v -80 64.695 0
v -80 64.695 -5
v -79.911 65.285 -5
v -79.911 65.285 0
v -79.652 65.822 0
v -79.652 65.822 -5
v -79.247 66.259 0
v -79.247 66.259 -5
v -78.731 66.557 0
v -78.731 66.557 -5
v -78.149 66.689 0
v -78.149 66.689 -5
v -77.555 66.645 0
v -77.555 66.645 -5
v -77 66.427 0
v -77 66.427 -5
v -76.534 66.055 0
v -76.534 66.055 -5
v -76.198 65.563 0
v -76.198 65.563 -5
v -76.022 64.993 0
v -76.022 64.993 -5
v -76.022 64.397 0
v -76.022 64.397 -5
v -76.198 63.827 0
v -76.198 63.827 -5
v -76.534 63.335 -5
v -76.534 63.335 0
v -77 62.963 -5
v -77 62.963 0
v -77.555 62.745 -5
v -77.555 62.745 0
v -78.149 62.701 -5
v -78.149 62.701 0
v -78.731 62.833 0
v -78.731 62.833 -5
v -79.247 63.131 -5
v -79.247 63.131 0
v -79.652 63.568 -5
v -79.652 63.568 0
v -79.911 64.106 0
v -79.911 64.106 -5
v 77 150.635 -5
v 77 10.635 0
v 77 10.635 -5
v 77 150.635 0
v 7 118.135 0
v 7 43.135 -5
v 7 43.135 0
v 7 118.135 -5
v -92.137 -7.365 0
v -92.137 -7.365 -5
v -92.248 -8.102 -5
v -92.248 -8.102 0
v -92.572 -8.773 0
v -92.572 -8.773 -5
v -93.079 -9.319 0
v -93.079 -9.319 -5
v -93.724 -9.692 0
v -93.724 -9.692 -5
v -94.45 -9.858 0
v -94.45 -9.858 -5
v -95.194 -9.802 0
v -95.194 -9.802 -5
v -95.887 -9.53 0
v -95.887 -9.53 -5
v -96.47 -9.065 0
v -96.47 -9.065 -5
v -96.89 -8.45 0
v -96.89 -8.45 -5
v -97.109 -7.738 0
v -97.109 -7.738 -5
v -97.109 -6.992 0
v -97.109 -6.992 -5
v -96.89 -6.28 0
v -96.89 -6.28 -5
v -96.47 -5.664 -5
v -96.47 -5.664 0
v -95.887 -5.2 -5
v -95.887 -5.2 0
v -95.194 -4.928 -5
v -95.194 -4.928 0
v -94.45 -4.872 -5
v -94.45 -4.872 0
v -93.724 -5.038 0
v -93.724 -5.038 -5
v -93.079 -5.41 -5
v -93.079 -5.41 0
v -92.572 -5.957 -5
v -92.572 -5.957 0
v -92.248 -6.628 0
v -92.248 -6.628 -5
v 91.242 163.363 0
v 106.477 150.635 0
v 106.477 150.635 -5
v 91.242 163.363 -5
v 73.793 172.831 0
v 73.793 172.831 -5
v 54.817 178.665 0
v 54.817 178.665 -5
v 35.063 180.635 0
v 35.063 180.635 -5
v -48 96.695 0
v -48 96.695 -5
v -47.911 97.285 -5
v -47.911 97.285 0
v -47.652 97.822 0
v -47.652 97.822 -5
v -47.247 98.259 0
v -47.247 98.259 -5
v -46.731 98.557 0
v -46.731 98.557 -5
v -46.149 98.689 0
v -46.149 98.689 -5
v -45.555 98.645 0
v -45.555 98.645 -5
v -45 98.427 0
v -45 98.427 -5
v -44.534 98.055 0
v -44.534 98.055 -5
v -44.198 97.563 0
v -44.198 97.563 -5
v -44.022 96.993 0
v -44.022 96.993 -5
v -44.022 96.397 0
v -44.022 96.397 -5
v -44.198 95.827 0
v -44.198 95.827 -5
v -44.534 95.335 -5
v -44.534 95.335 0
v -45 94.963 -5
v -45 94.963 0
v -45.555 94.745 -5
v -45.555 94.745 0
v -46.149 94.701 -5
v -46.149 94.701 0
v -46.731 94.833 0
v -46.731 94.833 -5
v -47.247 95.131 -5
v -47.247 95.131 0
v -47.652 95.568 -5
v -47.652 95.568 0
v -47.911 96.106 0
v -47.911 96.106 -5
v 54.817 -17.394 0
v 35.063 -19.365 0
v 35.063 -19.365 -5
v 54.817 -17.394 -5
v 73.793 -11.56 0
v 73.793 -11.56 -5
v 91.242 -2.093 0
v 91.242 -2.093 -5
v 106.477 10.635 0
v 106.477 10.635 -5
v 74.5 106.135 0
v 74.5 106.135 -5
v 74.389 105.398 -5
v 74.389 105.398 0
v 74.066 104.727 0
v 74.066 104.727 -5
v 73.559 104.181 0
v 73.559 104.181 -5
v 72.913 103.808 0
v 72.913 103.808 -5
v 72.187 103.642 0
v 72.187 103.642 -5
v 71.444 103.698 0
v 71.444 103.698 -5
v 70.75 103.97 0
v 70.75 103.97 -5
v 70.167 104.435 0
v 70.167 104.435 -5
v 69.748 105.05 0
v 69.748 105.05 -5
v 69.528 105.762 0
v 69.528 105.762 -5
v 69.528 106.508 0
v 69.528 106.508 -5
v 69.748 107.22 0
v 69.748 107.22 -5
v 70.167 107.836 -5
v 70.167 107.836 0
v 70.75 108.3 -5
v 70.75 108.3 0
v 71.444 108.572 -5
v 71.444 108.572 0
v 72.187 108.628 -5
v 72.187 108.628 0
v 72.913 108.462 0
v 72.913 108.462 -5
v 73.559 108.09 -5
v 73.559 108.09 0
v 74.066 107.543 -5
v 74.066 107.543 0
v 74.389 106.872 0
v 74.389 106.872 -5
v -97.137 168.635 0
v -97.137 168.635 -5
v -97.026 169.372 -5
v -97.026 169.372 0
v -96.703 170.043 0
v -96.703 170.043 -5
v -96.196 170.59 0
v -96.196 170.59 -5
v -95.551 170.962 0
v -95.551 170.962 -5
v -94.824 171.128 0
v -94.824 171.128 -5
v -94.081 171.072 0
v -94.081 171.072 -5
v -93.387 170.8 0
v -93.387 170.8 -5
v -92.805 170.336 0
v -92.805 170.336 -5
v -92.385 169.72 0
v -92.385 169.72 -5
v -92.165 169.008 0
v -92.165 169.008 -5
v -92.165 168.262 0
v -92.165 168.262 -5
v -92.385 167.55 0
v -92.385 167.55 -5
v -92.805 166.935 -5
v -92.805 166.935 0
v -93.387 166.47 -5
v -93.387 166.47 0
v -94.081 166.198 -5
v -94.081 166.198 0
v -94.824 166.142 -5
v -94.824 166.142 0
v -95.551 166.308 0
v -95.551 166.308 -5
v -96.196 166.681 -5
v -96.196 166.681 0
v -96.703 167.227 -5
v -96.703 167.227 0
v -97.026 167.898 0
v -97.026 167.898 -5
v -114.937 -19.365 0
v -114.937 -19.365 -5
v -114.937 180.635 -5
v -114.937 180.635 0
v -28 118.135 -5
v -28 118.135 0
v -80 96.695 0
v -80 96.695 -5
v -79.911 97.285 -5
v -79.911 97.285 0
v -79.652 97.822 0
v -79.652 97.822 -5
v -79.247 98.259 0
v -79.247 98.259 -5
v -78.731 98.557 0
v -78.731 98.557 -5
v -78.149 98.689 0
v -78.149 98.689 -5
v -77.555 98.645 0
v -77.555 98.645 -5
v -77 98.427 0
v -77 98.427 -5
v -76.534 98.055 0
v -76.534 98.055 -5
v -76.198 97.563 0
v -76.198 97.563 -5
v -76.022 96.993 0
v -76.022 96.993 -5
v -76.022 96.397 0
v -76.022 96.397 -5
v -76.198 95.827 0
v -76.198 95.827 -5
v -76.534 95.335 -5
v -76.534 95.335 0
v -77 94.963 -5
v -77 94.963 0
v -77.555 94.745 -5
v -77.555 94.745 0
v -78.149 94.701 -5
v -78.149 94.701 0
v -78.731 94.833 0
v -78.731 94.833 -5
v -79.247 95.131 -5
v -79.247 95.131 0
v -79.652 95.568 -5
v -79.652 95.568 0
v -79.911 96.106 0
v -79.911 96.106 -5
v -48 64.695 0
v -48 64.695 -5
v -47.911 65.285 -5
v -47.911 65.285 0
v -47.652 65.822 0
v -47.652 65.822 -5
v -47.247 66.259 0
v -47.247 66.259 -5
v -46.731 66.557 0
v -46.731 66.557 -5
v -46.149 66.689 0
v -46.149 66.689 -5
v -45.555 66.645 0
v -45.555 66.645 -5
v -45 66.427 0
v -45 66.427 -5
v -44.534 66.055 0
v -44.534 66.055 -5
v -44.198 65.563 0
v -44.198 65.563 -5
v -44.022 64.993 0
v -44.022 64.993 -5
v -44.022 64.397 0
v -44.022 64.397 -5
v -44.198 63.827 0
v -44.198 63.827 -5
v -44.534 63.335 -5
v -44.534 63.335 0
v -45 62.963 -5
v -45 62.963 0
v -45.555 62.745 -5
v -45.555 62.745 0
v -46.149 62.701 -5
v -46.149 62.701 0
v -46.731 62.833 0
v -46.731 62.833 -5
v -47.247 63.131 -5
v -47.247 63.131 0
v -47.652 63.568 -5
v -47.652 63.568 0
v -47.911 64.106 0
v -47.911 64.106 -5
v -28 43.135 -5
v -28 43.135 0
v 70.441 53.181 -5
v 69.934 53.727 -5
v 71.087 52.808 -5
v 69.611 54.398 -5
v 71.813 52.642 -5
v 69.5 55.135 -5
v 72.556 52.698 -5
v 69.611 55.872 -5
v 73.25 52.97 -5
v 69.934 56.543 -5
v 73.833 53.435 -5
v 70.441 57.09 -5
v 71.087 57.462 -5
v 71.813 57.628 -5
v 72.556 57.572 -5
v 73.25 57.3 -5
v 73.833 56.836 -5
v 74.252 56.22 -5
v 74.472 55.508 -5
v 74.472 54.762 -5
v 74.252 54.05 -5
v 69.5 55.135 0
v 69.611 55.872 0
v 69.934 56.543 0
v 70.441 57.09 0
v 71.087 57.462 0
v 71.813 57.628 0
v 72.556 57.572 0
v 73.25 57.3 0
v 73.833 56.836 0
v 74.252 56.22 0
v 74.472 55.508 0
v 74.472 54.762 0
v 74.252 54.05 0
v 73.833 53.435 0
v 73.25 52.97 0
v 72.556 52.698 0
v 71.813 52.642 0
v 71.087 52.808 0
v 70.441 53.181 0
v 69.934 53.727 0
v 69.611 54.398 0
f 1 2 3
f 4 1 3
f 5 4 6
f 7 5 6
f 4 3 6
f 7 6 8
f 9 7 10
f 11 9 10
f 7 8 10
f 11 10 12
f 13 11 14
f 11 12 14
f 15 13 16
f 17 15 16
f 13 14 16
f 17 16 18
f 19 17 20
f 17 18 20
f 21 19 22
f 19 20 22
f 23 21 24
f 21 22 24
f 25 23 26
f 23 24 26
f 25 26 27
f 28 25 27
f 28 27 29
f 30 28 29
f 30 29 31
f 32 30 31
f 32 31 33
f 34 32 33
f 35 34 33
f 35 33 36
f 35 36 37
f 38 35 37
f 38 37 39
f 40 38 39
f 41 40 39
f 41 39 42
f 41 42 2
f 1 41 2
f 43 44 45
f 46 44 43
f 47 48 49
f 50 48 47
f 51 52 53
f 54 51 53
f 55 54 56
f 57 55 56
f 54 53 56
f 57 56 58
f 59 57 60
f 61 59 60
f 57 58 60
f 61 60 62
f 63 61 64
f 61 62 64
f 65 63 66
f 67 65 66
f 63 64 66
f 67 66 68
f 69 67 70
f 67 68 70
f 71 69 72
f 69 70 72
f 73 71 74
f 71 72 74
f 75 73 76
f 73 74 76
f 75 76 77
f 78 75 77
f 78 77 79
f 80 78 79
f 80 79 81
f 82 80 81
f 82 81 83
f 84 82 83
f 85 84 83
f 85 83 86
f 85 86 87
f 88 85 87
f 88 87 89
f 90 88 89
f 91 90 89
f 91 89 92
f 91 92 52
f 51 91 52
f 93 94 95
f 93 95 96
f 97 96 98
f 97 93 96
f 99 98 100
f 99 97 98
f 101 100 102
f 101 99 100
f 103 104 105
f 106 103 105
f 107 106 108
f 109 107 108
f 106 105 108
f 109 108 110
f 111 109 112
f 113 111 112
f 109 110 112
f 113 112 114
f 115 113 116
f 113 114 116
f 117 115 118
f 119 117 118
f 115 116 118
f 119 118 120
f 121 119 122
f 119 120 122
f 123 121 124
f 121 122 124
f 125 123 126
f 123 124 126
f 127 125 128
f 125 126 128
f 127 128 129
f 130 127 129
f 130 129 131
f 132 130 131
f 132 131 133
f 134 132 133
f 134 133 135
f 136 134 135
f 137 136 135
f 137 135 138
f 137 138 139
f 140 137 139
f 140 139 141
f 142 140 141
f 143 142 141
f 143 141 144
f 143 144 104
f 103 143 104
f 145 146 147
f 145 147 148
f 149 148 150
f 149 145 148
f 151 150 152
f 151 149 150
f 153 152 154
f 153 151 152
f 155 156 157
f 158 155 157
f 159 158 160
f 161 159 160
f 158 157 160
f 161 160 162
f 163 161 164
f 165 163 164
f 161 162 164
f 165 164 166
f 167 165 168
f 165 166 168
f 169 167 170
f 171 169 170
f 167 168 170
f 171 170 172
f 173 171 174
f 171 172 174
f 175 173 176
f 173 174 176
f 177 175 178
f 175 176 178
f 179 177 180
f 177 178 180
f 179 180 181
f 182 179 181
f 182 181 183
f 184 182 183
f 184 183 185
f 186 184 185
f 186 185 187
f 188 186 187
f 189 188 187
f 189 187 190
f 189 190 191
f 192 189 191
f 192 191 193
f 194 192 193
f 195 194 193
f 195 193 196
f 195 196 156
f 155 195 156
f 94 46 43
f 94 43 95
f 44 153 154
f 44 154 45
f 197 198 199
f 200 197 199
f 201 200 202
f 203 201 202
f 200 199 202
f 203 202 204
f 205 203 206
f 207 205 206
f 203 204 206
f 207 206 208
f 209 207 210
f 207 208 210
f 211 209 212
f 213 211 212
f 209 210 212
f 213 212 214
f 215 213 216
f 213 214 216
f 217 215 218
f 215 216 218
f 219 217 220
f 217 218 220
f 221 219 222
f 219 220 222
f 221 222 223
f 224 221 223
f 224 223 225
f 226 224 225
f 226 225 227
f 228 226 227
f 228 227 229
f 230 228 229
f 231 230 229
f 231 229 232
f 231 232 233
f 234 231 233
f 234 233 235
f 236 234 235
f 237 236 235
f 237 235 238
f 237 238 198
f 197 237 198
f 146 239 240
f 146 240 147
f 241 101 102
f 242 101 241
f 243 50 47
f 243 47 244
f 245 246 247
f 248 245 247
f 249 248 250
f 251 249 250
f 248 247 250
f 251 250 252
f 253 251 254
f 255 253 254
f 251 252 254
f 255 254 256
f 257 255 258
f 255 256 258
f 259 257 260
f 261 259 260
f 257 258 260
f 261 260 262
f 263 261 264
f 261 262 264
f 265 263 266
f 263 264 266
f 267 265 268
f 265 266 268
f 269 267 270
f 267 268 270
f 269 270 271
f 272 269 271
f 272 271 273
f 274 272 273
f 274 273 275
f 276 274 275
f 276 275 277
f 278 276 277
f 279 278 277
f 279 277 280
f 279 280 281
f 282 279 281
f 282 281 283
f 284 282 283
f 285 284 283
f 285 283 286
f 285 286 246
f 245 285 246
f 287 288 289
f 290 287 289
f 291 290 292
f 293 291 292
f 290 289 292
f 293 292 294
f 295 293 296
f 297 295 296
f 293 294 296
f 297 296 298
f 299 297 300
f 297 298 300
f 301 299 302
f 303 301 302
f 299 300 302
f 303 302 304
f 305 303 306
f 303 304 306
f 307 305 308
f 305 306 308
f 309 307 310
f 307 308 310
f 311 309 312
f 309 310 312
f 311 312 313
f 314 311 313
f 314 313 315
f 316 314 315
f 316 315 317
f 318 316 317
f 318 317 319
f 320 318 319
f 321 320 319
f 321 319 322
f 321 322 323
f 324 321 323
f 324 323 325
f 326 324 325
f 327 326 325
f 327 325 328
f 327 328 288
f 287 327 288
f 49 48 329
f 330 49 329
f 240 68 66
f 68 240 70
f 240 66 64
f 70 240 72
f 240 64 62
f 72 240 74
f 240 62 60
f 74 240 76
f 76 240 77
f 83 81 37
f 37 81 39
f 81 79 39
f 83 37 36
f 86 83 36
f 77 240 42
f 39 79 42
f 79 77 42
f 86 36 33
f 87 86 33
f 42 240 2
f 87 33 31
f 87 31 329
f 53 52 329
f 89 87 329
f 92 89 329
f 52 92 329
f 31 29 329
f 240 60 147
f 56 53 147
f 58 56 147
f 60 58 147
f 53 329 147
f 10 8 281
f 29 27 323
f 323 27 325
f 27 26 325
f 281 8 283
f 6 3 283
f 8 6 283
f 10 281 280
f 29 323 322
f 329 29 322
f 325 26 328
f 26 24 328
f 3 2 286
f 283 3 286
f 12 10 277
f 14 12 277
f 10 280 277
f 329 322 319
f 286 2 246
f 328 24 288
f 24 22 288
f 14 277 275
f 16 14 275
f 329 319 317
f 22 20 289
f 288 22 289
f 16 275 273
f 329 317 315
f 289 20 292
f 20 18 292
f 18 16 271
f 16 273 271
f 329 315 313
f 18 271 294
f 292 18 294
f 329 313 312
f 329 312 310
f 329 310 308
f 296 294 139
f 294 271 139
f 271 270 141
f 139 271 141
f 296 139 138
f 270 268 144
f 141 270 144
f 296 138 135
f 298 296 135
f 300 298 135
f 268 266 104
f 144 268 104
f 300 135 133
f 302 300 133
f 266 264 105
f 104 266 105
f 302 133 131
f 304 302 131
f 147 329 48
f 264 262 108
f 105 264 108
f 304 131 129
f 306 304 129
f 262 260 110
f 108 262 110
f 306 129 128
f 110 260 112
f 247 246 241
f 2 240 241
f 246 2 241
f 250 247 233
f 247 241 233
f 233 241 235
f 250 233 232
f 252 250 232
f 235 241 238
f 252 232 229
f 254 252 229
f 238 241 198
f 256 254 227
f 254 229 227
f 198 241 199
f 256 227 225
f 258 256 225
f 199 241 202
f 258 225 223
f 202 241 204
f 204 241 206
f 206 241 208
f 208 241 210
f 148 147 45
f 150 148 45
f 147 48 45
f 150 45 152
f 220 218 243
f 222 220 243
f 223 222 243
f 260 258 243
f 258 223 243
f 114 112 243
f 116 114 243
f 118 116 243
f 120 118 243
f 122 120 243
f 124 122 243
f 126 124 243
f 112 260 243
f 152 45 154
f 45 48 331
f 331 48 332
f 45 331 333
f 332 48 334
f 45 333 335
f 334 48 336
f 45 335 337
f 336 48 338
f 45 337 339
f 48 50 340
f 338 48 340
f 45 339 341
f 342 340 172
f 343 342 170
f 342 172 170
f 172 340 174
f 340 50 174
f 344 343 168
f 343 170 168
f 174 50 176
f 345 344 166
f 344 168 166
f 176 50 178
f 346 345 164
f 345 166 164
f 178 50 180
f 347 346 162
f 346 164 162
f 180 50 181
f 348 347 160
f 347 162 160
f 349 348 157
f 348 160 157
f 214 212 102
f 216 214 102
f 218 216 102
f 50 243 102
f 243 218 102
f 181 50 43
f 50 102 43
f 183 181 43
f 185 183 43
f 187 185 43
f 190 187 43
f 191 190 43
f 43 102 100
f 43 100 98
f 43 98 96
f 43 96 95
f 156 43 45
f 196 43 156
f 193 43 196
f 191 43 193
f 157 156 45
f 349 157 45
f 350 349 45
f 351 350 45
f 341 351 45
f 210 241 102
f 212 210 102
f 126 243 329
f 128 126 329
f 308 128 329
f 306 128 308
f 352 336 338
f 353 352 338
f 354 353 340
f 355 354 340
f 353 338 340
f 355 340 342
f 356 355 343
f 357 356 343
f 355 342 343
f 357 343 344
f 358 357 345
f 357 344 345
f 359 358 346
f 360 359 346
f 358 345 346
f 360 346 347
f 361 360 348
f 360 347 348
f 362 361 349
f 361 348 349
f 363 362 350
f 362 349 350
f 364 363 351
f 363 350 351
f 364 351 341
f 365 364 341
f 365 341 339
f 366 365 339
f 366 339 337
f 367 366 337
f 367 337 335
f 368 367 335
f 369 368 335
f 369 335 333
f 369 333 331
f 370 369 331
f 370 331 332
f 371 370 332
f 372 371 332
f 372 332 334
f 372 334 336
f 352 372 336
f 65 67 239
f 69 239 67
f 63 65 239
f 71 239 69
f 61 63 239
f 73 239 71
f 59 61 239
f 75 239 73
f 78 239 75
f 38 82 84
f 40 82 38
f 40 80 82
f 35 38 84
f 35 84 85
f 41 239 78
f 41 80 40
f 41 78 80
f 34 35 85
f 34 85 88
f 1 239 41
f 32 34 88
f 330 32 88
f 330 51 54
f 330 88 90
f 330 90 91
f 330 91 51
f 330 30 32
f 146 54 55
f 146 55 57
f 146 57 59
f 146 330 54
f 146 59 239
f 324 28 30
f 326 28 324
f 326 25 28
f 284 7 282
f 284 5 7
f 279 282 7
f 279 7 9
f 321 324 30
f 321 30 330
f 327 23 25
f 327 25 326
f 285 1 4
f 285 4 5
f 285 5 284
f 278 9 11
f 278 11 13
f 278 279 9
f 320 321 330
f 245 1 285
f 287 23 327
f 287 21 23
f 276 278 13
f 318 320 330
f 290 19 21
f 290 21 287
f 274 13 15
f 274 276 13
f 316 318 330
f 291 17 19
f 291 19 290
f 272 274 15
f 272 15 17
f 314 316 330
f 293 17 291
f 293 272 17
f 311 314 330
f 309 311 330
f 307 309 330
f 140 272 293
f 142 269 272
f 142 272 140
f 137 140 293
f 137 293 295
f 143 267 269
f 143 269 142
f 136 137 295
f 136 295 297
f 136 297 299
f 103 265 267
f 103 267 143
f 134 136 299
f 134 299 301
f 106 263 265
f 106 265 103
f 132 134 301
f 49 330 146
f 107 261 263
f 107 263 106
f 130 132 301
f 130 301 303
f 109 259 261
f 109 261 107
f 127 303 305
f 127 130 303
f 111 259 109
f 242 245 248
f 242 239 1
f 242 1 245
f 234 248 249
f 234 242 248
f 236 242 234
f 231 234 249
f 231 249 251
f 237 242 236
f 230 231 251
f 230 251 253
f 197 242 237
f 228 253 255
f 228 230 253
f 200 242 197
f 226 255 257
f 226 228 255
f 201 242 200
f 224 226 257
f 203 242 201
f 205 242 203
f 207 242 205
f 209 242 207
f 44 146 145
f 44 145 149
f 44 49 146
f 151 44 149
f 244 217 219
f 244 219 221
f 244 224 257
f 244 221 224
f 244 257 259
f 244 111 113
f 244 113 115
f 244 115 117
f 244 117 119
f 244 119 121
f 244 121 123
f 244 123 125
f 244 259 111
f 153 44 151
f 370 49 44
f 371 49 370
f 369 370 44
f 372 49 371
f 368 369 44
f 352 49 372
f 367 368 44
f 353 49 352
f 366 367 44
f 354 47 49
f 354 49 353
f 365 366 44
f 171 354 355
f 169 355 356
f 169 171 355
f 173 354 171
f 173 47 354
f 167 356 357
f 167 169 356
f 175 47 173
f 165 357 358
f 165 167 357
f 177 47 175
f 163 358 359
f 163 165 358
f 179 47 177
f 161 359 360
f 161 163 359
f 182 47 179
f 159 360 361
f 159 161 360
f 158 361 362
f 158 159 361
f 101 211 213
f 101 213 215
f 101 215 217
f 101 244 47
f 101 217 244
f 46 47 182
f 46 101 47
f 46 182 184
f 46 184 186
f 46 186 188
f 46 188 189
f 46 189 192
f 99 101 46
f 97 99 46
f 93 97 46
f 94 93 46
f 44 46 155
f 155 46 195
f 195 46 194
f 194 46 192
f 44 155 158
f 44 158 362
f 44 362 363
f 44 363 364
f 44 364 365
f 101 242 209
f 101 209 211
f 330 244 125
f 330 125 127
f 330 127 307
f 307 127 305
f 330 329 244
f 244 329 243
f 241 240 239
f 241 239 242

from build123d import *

# Parameters (mm, degrees)
BOSS_EXTRUDE1_DEPTH = 5
SKETCH2_R           = 2.5
SKETCH2_W           = 35
SKETCH2_H           = 75
CUT_EXTRUDE1_DEPTH  = 10
SKETCH4_R           = 2
CUT_EXTRUDE3_DEPTH  = 10
SKETCH5_R           = 2.5
CUT_EXTRUDE4_DEPTH  = 10
SKETCH6_W           = 242.754098284
SKETCH6_H           = 200
CUT_EXTRUDE5_DEPTH  = 10


with BuildPart() as part:
    # Sketch1 → Boss-Extrude1 (new body)
    with BuildSketch(Plane.XY):
        with BuildLine():
            Line((77, 150.635083269), (106.477021815, 150.635083269))
            ThreePointArc((106.477021815, 150.635083269), (73.792570992, 172.830527842), (35.06273753, 180.635083269))
            Line((35.06273753, 180.635083269), (-264.93726247, 180.635083269))
            ThreePointArc((-264.93726247, 180.635083269), (-303.667095932, 172.830527842), (-336.351546756, 150.635083269))
            Line((-336.351546756, 150.635083269), (-306.874524941, 150.635083269))
            Line((-306.874524941, 150.635083269), (-306.874524941, 10.635083269))
            Line((-306.874524941, 10.635083269), (-336.351546756, 10.635083269))
            ThreePointArc((-336.351546756, 10.635083269), (-303.667095932, -11.560361304), (-264.93726247, -19.364916731))
            Line((-264.93726247, -19.364916731), (35.06273753, -19.364916731))
            ThreePointArc((35.06273753, -19.364916731), (73.792570992, -11.560361304), (106.477021815, 10.635083269))
            Line((106.477021815, 10.635083269), (77, 10.635083269))
            Line((77, 10.635083269), (77, 150.635083269))
        make_face()
    extrude(amount=-BOSS_EXTRUDE1_DEPTH)

    # Sketch2 → Cut-Extrude1 (cut)
    with BuildSketch(Plane(origin=(0, 0, -5), x_dir=(-1, 0, 0), z_dir=(0, 0, -1))):
        with Locations((301.874524941, 106.135083269)):
            Circle(SKETCH2_R)
        with Locations(Location((301.874524941, 55.135083269, 0), (0, 0, 180))):
            Circle(SKETCH2_R)
        with Locations((-72, 55.135083269)):
            Circle(SKETCH2_R)
        with Locations(Location((-72, 106.135083269, 0), (0, 0, 180))):
            Circle(SKETCH2_R)
        with Locations((219.374524941, 80.635083269)):
            Rectangle(SKETCH2_W, SKETCH2_H)
        with Locations((10.5, 80.635083269)):
            Rectangle(SKETCH2_W, SKETCH2_H)
    extrude(amount=-CUT_EXTRUDE1_DEPTH, mode=Mode.SUBTRACT)

    # Sketch4 → Cut-Extrude3 (cut)
    with BuildSketch(Plane(origin=(0, 0, -5), x_dir=(-1, 0, 0), z_dir=(0, 0, -1))):
        with Locations((46, 64.695083269)):
            Circle(SKETCH4_R)
        with Locations((46, 96.695083269)):
            Circle(SKETCH4_R)
        with Locations((78, 64.695083269)):
            Circle(SKETCH4_R)
        with Locations((78, 96.695083269)):
            Circle(SKETCH4_R)
        with Locations(Location((151.874524941, 64.695083269, 0), (0, 0, 180))):
            Circle(SKETCH4_R)
        with Locations(Location((183.874524941, 64.695083269, 0), (0, 0, 180))):
            Circle(SKETCH4_R)
        with Locations(Location((183.874524941, 96.695083269, 0), (0, 0, 180))):
            Circle(SKETCH4_R)
        with Locations(Location((151.874524941, 96.695083269, 0), (0, 0, 180))):
            Circle(SKETCH4_R)
    extrude(amount=-CUT_EXTRUDE3_DEPTH, mode=Mode.SUBTRACT)

    # Sketch5 → Cut-Extrude4 (cut)
    with BuildSketch(Plane(origin=(0, 0, -5), x_dir=(-1, 0, 0), z_dir=(0, 0, -1))):
        with Locations((94.63726247, 168.635083269)):
            Circle(SKETCH5_R)
        with Locations((135.23726247, 168.635083269)):
            Circle(SKETCH5_R)
        with Locations(Location((94.63726247, -7.364916731, 0), (0, 0, 180))):
            Circle(SKETCH5_R)
        with Locations(Location((135.23726247, -7.364916731, 0), (0, 0, 180))):
            Circle(SKETCH5_R)
    extrude(amount=-CUT_EXTRUDE4_DEPTH, mode=Mode.SUBTRACT)

    # Sketch6 → Cut-Extrude5 (cut)
    with BuildSketch(Plane(origin=(0, 0, -5), x_dir=(-1, 0, 0), z_dir=(0, 0, -1))):
        with Locations((236.314311612, 80.635083269)):
            Rectangle(SKETCH6_W, SKETCH6_H)
    extrude(amount=-CUT_EXTRUDE5_DEPTH, mode=Mode.SUBTRACT)


solid = part.part
